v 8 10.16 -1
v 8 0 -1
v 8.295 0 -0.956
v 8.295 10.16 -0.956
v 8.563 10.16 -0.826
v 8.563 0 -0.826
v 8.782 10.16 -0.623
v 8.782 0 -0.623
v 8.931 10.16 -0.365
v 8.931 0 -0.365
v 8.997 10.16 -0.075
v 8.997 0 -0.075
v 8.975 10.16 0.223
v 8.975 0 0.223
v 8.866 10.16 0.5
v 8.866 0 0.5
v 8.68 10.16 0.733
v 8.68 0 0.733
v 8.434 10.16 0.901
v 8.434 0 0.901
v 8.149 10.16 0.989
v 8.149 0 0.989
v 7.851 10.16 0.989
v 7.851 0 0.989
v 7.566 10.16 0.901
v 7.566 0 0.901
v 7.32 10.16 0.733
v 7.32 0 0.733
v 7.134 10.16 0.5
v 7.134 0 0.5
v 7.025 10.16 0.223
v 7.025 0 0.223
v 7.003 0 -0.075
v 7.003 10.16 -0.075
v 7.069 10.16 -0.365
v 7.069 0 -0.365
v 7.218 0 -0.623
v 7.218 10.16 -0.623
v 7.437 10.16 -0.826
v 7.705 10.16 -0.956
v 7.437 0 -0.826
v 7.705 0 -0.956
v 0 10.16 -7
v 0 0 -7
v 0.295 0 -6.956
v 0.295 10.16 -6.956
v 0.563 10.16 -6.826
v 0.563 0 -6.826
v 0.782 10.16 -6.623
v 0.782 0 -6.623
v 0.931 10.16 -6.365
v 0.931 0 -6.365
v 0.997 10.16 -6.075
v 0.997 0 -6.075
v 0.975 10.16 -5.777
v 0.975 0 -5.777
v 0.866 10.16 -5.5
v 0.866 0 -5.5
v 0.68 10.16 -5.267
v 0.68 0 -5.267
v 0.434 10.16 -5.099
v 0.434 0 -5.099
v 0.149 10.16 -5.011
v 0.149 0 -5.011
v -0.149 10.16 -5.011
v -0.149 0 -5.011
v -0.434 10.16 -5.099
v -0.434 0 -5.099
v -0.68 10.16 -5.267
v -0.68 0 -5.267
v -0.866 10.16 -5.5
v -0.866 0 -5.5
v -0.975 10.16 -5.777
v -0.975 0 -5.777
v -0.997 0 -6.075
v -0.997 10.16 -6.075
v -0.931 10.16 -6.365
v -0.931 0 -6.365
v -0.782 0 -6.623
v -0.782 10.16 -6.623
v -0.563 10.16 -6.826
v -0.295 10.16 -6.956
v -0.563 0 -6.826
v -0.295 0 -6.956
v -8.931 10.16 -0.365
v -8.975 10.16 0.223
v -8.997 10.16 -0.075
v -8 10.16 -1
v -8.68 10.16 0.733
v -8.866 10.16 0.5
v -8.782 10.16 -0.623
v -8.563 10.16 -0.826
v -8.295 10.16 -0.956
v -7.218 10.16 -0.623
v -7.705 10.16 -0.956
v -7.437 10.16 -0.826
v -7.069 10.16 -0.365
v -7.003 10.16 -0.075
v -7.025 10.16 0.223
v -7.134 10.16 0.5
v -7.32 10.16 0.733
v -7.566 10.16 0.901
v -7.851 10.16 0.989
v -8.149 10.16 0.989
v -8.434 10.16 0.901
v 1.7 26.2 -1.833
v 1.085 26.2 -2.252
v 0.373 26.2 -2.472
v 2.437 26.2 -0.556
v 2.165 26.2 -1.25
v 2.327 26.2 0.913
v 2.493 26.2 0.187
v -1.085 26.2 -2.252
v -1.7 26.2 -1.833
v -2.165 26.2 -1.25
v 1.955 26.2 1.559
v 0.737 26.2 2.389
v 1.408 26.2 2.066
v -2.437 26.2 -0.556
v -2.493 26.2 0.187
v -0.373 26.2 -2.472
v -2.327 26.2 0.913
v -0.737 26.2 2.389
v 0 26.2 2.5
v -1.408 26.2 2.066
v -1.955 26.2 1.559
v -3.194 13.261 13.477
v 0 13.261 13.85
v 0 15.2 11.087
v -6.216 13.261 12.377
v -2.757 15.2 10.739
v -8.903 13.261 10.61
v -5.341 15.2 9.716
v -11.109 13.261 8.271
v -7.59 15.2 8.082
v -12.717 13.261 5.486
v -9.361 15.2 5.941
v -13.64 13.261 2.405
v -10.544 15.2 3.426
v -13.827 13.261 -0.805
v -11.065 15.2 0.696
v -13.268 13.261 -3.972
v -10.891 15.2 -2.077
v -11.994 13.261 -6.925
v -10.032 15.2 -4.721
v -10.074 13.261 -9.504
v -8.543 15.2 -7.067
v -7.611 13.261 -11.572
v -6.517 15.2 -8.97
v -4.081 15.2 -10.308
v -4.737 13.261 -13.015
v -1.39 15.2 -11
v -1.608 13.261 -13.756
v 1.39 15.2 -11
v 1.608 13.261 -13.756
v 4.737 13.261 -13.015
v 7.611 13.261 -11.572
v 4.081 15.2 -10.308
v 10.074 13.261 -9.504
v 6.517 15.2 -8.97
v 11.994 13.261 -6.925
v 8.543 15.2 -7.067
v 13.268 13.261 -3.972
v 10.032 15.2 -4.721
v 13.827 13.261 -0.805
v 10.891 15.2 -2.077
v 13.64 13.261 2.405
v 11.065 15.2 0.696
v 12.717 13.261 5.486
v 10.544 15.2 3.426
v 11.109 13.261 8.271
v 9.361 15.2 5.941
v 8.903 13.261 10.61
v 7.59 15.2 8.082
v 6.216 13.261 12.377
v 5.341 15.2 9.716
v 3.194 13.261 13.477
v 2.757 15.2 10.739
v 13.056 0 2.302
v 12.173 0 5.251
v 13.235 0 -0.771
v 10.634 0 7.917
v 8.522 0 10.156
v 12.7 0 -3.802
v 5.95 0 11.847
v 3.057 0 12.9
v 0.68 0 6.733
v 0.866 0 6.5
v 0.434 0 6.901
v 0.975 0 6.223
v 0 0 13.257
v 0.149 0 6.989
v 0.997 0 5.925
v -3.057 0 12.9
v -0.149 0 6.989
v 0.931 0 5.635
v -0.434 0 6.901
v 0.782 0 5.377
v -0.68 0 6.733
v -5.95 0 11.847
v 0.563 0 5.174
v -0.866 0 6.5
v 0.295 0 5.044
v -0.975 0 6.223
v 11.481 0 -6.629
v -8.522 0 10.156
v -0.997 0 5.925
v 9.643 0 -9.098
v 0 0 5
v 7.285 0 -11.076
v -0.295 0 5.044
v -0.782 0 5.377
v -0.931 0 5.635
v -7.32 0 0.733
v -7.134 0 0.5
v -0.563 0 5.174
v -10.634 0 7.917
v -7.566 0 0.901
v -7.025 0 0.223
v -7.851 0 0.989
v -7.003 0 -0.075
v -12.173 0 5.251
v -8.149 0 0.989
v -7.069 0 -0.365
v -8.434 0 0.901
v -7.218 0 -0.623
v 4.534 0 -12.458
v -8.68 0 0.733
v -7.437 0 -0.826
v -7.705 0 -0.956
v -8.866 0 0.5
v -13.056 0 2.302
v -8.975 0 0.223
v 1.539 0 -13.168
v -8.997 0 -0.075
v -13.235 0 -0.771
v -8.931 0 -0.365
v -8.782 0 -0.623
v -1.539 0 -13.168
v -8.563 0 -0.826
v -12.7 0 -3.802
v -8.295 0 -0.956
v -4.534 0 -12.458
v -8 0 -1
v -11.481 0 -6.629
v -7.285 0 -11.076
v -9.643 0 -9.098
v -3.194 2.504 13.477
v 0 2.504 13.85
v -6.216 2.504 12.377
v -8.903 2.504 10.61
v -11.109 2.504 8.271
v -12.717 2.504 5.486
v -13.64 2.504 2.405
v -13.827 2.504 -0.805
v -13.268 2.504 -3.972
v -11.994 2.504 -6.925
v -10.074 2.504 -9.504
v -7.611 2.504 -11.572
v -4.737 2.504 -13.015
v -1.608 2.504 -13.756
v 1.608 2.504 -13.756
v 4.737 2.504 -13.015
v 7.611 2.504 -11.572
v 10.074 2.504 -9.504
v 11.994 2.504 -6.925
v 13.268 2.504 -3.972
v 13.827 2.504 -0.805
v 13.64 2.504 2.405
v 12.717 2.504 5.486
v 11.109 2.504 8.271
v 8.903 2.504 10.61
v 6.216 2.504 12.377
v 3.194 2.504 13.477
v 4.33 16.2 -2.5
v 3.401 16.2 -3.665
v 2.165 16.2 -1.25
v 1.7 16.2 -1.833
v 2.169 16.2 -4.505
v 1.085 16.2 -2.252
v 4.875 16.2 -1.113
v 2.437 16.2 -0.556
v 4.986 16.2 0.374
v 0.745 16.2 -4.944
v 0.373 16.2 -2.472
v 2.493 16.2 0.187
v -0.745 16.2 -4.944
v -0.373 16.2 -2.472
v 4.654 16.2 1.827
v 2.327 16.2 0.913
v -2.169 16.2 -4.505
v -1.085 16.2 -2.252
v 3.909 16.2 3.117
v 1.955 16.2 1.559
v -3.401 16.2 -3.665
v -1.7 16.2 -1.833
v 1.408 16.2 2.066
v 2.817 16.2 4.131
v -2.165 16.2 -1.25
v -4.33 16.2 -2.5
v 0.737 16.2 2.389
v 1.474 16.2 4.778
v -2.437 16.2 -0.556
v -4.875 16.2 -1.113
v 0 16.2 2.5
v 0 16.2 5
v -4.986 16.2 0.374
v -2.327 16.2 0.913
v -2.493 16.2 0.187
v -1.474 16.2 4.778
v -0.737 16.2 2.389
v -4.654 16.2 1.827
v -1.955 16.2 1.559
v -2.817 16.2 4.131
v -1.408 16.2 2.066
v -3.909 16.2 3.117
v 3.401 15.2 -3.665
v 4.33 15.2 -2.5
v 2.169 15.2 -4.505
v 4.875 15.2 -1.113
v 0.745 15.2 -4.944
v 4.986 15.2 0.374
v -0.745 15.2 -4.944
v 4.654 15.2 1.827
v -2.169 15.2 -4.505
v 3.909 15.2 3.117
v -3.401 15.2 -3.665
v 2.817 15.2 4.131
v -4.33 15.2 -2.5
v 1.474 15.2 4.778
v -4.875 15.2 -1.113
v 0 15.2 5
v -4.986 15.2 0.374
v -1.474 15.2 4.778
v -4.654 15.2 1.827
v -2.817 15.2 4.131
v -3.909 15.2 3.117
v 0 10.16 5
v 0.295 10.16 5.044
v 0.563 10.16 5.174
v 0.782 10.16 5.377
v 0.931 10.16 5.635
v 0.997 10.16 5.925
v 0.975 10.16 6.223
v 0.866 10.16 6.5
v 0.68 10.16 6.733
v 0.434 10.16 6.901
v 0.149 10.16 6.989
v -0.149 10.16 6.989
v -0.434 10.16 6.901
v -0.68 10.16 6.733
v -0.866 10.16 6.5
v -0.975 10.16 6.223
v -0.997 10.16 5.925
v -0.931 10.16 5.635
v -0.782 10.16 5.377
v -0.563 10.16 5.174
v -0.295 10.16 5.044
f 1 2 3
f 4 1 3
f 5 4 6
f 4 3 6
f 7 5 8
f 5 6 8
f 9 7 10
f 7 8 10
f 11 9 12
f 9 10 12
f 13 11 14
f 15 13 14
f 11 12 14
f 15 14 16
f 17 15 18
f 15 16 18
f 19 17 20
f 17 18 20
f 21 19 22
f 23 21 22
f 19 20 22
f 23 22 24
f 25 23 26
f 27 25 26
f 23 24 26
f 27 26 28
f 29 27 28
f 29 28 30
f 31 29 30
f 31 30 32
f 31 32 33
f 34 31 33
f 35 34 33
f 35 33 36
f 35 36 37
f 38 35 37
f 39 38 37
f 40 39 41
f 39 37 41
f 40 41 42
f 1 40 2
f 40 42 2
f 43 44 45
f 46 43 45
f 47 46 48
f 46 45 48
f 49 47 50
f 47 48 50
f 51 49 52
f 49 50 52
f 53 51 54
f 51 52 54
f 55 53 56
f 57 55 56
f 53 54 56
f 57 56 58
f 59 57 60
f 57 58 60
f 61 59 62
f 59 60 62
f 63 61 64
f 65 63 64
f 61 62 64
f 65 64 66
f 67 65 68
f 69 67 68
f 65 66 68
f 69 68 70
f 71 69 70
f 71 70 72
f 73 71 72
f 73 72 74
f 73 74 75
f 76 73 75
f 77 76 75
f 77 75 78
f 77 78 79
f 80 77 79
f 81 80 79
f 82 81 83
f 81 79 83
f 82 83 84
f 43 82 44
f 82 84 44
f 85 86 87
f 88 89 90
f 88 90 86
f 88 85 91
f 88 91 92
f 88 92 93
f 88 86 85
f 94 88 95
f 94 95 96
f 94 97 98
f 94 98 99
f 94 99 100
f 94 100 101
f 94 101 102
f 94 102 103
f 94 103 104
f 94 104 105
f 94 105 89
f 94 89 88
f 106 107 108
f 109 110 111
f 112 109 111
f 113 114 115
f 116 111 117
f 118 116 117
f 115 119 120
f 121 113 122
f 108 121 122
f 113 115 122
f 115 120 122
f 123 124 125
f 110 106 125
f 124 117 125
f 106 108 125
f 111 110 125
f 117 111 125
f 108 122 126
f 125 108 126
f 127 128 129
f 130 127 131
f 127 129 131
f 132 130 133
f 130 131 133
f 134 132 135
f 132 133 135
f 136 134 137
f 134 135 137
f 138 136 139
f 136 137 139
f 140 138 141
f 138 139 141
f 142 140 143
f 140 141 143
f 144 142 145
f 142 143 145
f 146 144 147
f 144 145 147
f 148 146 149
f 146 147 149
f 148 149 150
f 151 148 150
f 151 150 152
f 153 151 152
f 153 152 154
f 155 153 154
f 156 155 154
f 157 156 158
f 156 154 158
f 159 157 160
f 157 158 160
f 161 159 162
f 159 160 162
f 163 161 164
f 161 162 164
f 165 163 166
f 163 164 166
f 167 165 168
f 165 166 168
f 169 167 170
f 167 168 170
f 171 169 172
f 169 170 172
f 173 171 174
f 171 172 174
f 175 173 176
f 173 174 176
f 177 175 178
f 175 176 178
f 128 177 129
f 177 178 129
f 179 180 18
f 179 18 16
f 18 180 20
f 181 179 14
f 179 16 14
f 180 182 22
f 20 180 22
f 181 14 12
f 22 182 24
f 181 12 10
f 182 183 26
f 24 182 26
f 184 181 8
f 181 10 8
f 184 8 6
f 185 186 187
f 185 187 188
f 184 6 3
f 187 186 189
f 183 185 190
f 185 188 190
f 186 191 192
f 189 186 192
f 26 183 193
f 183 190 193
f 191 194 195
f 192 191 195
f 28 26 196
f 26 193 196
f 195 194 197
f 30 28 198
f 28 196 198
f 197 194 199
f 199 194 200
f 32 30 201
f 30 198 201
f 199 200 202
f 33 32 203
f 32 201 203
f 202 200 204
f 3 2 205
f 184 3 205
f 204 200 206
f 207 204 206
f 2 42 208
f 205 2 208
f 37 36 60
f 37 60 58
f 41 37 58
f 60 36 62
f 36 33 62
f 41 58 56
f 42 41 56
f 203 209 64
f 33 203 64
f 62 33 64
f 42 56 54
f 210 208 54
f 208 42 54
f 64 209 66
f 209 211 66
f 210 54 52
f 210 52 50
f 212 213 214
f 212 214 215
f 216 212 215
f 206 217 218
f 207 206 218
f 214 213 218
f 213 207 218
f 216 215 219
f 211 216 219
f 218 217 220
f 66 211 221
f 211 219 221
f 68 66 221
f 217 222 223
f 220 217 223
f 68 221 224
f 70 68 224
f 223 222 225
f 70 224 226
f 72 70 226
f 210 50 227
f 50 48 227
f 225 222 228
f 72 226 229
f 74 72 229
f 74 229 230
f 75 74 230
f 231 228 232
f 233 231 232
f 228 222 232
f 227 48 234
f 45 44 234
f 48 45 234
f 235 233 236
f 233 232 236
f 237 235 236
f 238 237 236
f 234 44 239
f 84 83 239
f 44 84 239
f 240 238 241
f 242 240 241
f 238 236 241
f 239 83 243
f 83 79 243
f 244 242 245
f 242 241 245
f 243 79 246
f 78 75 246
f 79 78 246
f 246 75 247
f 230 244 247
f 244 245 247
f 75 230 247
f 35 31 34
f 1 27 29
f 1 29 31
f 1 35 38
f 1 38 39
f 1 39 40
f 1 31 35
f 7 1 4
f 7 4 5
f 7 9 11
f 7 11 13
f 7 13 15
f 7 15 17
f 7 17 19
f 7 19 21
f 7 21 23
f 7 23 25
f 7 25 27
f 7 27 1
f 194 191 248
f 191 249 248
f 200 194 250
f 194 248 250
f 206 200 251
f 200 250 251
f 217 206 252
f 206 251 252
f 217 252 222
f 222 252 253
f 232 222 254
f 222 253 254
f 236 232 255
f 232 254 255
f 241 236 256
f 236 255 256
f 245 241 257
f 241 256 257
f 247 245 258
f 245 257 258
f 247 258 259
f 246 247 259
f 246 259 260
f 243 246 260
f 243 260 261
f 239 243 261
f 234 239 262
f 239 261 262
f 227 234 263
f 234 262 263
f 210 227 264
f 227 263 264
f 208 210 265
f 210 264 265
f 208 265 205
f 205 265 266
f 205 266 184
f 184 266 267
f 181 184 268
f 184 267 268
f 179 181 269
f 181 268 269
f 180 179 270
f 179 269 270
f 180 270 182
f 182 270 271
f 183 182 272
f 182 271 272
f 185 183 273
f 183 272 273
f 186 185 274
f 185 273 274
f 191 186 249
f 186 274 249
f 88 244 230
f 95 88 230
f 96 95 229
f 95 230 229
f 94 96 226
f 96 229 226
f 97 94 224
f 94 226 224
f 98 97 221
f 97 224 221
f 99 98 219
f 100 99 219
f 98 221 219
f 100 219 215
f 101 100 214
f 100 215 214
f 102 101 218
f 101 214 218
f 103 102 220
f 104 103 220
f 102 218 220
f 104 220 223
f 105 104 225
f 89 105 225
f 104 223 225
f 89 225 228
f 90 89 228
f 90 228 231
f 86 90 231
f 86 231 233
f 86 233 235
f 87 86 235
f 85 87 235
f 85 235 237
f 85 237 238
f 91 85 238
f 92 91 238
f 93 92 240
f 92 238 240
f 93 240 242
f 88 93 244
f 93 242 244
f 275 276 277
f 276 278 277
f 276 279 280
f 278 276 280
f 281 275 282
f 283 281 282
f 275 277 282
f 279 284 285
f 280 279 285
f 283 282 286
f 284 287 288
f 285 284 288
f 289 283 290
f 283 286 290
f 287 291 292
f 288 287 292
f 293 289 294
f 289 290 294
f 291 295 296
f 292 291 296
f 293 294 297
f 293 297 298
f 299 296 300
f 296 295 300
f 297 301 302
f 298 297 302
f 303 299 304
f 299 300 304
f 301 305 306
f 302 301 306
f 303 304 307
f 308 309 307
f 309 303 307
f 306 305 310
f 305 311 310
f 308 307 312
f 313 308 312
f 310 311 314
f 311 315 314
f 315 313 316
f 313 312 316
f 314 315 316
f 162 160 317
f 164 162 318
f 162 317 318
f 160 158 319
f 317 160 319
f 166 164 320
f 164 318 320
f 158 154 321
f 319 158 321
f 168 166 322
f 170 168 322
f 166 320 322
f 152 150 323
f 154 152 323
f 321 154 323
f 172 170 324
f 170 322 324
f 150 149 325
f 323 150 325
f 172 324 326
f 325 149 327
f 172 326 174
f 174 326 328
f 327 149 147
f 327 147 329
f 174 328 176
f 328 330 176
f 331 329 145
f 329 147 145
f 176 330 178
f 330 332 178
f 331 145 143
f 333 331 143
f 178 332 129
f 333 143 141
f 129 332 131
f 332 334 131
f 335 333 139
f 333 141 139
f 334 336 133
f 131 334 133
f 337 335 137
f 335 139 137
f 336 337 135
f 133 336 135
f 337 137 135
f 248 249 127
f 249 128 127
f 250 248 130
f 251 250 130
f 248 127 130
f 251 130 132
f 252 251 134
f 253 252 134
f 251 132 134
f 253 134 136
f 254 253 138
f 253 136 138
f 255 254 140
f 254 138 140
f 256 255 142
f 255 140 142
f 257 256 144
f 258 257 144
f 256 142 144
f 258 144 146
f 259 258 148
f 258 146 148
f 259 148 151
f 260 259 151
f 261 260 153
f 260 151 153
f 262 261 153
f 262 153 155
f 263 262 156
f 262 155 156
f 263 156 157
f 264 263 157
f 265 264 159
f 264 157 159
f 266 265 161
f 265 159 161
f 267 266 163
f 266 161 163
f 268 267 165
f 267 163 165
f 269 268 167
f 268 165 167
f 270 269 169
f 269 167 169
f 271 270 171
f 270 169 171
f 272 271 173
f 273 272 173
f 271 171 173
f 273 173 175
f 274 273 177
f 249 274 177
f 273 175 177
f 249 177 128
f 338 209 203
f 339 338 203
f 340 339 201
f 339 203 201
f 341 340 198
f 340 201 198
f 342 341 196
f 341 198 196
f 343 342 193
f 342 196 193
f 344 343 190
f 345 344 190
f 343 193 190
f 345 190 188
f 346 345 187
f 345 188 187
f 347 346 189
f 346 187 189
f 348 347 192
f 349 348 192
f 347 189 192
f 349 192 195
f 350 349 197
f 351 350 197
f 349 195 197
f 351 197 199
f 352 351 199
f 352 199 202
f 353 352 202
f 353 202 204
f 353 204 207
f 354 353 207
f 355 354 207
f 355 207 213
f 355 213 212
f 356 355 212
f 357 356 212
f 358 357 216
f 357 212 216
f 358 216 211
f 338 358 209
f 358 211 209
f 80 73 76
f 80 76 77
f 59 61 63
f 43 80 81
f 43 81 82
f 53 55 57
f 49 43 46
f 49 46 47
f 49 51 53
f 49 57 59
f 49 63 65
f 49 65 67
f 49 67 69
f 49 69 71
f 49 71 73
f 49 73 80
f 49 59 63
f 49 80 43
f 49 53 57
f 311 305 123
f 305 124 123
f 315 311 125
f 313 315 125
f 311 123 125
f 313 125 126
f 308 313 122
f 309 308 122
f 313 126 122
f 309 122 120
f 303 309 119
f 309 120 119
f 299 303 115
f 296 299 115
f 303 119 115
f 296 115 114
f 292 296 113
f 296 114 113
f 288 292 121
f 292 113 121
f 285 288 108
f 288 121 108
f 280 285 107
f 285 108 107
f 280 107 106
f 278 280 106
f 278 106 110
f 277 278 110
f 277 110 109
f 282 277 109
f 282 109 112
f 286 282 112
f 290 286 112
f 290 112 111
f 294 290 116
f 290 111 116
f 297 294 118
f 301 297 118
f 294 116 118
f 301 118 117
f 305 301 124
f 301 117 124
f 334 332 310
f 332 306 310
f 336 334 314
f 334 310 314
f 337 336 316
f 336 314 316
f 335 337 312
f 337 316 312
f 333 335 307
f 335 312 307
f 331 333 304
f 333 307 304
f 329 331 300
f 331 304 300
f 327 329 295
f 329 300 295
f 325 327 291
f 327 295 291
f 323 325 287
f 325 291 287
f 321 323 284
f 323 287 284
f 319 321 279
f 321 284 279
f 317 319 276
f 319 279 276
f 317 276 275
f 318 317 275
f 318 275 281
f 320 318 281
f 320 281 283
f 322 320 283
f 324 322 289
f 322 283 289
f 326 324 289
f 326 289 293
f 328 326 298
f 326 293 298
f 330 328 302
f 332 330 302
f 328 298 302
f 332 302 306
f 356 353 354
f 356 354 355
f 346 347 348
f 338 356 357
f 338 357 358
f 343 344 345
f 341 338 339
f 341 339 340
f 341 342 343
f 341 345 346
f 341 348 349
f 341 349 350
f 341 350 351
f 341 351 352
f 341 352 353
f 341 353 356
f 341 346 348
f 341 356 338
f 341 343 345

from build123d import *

# Parameters (mm, degrees)
SKETCH2_R          = 1
CUT_EXTRUDE1_DEPTH = 10.16


with BuildPart() as part:
    # Sketch1 → Revolve1 (revolve)
    with BuildSketch(Plane(origin=(0, 0, 0), x_dir=(0, 0, -1), z_dir=(1, 0, 0))):
        Polygon((0, 0), (-13.257279683, 0), (-13.85, 2.503549111), (-13.85, 13.261063329), (-11.086941731, 15.2), (-5, 15.2), (-5, 16.2), (-2.5, 16.2), (-2.5, 26.2), (0, 26.2), align=None)
    revolve(axis=Axis((0, 26.2, 0), (0, -1, 0)))

    # Sketch2 → Cut-Extrude1 (cut)
    with BuildSketch(Plane.XZ):
        with Locations(Location((0, 6, 0), (0, 0, 270))):
            Circle(SKETCH2_R)
        with Locations(Location((8, 0, 0), (0, 0, 270))):
            Circle(SKETCH2_R)
        with Locations(Location((0, -6, 0), (0, 0, 270))):
            Circle(SKETCH2_R)
        with Locations(Location((-8, 0, 0), (0, 0, 270))):
            Circle(SKETCH2_R)
    extrude(amount=-CUT_EXTRUDE1_DEPTH, mode=Mode.SUBTRACT)


solid = part.part
